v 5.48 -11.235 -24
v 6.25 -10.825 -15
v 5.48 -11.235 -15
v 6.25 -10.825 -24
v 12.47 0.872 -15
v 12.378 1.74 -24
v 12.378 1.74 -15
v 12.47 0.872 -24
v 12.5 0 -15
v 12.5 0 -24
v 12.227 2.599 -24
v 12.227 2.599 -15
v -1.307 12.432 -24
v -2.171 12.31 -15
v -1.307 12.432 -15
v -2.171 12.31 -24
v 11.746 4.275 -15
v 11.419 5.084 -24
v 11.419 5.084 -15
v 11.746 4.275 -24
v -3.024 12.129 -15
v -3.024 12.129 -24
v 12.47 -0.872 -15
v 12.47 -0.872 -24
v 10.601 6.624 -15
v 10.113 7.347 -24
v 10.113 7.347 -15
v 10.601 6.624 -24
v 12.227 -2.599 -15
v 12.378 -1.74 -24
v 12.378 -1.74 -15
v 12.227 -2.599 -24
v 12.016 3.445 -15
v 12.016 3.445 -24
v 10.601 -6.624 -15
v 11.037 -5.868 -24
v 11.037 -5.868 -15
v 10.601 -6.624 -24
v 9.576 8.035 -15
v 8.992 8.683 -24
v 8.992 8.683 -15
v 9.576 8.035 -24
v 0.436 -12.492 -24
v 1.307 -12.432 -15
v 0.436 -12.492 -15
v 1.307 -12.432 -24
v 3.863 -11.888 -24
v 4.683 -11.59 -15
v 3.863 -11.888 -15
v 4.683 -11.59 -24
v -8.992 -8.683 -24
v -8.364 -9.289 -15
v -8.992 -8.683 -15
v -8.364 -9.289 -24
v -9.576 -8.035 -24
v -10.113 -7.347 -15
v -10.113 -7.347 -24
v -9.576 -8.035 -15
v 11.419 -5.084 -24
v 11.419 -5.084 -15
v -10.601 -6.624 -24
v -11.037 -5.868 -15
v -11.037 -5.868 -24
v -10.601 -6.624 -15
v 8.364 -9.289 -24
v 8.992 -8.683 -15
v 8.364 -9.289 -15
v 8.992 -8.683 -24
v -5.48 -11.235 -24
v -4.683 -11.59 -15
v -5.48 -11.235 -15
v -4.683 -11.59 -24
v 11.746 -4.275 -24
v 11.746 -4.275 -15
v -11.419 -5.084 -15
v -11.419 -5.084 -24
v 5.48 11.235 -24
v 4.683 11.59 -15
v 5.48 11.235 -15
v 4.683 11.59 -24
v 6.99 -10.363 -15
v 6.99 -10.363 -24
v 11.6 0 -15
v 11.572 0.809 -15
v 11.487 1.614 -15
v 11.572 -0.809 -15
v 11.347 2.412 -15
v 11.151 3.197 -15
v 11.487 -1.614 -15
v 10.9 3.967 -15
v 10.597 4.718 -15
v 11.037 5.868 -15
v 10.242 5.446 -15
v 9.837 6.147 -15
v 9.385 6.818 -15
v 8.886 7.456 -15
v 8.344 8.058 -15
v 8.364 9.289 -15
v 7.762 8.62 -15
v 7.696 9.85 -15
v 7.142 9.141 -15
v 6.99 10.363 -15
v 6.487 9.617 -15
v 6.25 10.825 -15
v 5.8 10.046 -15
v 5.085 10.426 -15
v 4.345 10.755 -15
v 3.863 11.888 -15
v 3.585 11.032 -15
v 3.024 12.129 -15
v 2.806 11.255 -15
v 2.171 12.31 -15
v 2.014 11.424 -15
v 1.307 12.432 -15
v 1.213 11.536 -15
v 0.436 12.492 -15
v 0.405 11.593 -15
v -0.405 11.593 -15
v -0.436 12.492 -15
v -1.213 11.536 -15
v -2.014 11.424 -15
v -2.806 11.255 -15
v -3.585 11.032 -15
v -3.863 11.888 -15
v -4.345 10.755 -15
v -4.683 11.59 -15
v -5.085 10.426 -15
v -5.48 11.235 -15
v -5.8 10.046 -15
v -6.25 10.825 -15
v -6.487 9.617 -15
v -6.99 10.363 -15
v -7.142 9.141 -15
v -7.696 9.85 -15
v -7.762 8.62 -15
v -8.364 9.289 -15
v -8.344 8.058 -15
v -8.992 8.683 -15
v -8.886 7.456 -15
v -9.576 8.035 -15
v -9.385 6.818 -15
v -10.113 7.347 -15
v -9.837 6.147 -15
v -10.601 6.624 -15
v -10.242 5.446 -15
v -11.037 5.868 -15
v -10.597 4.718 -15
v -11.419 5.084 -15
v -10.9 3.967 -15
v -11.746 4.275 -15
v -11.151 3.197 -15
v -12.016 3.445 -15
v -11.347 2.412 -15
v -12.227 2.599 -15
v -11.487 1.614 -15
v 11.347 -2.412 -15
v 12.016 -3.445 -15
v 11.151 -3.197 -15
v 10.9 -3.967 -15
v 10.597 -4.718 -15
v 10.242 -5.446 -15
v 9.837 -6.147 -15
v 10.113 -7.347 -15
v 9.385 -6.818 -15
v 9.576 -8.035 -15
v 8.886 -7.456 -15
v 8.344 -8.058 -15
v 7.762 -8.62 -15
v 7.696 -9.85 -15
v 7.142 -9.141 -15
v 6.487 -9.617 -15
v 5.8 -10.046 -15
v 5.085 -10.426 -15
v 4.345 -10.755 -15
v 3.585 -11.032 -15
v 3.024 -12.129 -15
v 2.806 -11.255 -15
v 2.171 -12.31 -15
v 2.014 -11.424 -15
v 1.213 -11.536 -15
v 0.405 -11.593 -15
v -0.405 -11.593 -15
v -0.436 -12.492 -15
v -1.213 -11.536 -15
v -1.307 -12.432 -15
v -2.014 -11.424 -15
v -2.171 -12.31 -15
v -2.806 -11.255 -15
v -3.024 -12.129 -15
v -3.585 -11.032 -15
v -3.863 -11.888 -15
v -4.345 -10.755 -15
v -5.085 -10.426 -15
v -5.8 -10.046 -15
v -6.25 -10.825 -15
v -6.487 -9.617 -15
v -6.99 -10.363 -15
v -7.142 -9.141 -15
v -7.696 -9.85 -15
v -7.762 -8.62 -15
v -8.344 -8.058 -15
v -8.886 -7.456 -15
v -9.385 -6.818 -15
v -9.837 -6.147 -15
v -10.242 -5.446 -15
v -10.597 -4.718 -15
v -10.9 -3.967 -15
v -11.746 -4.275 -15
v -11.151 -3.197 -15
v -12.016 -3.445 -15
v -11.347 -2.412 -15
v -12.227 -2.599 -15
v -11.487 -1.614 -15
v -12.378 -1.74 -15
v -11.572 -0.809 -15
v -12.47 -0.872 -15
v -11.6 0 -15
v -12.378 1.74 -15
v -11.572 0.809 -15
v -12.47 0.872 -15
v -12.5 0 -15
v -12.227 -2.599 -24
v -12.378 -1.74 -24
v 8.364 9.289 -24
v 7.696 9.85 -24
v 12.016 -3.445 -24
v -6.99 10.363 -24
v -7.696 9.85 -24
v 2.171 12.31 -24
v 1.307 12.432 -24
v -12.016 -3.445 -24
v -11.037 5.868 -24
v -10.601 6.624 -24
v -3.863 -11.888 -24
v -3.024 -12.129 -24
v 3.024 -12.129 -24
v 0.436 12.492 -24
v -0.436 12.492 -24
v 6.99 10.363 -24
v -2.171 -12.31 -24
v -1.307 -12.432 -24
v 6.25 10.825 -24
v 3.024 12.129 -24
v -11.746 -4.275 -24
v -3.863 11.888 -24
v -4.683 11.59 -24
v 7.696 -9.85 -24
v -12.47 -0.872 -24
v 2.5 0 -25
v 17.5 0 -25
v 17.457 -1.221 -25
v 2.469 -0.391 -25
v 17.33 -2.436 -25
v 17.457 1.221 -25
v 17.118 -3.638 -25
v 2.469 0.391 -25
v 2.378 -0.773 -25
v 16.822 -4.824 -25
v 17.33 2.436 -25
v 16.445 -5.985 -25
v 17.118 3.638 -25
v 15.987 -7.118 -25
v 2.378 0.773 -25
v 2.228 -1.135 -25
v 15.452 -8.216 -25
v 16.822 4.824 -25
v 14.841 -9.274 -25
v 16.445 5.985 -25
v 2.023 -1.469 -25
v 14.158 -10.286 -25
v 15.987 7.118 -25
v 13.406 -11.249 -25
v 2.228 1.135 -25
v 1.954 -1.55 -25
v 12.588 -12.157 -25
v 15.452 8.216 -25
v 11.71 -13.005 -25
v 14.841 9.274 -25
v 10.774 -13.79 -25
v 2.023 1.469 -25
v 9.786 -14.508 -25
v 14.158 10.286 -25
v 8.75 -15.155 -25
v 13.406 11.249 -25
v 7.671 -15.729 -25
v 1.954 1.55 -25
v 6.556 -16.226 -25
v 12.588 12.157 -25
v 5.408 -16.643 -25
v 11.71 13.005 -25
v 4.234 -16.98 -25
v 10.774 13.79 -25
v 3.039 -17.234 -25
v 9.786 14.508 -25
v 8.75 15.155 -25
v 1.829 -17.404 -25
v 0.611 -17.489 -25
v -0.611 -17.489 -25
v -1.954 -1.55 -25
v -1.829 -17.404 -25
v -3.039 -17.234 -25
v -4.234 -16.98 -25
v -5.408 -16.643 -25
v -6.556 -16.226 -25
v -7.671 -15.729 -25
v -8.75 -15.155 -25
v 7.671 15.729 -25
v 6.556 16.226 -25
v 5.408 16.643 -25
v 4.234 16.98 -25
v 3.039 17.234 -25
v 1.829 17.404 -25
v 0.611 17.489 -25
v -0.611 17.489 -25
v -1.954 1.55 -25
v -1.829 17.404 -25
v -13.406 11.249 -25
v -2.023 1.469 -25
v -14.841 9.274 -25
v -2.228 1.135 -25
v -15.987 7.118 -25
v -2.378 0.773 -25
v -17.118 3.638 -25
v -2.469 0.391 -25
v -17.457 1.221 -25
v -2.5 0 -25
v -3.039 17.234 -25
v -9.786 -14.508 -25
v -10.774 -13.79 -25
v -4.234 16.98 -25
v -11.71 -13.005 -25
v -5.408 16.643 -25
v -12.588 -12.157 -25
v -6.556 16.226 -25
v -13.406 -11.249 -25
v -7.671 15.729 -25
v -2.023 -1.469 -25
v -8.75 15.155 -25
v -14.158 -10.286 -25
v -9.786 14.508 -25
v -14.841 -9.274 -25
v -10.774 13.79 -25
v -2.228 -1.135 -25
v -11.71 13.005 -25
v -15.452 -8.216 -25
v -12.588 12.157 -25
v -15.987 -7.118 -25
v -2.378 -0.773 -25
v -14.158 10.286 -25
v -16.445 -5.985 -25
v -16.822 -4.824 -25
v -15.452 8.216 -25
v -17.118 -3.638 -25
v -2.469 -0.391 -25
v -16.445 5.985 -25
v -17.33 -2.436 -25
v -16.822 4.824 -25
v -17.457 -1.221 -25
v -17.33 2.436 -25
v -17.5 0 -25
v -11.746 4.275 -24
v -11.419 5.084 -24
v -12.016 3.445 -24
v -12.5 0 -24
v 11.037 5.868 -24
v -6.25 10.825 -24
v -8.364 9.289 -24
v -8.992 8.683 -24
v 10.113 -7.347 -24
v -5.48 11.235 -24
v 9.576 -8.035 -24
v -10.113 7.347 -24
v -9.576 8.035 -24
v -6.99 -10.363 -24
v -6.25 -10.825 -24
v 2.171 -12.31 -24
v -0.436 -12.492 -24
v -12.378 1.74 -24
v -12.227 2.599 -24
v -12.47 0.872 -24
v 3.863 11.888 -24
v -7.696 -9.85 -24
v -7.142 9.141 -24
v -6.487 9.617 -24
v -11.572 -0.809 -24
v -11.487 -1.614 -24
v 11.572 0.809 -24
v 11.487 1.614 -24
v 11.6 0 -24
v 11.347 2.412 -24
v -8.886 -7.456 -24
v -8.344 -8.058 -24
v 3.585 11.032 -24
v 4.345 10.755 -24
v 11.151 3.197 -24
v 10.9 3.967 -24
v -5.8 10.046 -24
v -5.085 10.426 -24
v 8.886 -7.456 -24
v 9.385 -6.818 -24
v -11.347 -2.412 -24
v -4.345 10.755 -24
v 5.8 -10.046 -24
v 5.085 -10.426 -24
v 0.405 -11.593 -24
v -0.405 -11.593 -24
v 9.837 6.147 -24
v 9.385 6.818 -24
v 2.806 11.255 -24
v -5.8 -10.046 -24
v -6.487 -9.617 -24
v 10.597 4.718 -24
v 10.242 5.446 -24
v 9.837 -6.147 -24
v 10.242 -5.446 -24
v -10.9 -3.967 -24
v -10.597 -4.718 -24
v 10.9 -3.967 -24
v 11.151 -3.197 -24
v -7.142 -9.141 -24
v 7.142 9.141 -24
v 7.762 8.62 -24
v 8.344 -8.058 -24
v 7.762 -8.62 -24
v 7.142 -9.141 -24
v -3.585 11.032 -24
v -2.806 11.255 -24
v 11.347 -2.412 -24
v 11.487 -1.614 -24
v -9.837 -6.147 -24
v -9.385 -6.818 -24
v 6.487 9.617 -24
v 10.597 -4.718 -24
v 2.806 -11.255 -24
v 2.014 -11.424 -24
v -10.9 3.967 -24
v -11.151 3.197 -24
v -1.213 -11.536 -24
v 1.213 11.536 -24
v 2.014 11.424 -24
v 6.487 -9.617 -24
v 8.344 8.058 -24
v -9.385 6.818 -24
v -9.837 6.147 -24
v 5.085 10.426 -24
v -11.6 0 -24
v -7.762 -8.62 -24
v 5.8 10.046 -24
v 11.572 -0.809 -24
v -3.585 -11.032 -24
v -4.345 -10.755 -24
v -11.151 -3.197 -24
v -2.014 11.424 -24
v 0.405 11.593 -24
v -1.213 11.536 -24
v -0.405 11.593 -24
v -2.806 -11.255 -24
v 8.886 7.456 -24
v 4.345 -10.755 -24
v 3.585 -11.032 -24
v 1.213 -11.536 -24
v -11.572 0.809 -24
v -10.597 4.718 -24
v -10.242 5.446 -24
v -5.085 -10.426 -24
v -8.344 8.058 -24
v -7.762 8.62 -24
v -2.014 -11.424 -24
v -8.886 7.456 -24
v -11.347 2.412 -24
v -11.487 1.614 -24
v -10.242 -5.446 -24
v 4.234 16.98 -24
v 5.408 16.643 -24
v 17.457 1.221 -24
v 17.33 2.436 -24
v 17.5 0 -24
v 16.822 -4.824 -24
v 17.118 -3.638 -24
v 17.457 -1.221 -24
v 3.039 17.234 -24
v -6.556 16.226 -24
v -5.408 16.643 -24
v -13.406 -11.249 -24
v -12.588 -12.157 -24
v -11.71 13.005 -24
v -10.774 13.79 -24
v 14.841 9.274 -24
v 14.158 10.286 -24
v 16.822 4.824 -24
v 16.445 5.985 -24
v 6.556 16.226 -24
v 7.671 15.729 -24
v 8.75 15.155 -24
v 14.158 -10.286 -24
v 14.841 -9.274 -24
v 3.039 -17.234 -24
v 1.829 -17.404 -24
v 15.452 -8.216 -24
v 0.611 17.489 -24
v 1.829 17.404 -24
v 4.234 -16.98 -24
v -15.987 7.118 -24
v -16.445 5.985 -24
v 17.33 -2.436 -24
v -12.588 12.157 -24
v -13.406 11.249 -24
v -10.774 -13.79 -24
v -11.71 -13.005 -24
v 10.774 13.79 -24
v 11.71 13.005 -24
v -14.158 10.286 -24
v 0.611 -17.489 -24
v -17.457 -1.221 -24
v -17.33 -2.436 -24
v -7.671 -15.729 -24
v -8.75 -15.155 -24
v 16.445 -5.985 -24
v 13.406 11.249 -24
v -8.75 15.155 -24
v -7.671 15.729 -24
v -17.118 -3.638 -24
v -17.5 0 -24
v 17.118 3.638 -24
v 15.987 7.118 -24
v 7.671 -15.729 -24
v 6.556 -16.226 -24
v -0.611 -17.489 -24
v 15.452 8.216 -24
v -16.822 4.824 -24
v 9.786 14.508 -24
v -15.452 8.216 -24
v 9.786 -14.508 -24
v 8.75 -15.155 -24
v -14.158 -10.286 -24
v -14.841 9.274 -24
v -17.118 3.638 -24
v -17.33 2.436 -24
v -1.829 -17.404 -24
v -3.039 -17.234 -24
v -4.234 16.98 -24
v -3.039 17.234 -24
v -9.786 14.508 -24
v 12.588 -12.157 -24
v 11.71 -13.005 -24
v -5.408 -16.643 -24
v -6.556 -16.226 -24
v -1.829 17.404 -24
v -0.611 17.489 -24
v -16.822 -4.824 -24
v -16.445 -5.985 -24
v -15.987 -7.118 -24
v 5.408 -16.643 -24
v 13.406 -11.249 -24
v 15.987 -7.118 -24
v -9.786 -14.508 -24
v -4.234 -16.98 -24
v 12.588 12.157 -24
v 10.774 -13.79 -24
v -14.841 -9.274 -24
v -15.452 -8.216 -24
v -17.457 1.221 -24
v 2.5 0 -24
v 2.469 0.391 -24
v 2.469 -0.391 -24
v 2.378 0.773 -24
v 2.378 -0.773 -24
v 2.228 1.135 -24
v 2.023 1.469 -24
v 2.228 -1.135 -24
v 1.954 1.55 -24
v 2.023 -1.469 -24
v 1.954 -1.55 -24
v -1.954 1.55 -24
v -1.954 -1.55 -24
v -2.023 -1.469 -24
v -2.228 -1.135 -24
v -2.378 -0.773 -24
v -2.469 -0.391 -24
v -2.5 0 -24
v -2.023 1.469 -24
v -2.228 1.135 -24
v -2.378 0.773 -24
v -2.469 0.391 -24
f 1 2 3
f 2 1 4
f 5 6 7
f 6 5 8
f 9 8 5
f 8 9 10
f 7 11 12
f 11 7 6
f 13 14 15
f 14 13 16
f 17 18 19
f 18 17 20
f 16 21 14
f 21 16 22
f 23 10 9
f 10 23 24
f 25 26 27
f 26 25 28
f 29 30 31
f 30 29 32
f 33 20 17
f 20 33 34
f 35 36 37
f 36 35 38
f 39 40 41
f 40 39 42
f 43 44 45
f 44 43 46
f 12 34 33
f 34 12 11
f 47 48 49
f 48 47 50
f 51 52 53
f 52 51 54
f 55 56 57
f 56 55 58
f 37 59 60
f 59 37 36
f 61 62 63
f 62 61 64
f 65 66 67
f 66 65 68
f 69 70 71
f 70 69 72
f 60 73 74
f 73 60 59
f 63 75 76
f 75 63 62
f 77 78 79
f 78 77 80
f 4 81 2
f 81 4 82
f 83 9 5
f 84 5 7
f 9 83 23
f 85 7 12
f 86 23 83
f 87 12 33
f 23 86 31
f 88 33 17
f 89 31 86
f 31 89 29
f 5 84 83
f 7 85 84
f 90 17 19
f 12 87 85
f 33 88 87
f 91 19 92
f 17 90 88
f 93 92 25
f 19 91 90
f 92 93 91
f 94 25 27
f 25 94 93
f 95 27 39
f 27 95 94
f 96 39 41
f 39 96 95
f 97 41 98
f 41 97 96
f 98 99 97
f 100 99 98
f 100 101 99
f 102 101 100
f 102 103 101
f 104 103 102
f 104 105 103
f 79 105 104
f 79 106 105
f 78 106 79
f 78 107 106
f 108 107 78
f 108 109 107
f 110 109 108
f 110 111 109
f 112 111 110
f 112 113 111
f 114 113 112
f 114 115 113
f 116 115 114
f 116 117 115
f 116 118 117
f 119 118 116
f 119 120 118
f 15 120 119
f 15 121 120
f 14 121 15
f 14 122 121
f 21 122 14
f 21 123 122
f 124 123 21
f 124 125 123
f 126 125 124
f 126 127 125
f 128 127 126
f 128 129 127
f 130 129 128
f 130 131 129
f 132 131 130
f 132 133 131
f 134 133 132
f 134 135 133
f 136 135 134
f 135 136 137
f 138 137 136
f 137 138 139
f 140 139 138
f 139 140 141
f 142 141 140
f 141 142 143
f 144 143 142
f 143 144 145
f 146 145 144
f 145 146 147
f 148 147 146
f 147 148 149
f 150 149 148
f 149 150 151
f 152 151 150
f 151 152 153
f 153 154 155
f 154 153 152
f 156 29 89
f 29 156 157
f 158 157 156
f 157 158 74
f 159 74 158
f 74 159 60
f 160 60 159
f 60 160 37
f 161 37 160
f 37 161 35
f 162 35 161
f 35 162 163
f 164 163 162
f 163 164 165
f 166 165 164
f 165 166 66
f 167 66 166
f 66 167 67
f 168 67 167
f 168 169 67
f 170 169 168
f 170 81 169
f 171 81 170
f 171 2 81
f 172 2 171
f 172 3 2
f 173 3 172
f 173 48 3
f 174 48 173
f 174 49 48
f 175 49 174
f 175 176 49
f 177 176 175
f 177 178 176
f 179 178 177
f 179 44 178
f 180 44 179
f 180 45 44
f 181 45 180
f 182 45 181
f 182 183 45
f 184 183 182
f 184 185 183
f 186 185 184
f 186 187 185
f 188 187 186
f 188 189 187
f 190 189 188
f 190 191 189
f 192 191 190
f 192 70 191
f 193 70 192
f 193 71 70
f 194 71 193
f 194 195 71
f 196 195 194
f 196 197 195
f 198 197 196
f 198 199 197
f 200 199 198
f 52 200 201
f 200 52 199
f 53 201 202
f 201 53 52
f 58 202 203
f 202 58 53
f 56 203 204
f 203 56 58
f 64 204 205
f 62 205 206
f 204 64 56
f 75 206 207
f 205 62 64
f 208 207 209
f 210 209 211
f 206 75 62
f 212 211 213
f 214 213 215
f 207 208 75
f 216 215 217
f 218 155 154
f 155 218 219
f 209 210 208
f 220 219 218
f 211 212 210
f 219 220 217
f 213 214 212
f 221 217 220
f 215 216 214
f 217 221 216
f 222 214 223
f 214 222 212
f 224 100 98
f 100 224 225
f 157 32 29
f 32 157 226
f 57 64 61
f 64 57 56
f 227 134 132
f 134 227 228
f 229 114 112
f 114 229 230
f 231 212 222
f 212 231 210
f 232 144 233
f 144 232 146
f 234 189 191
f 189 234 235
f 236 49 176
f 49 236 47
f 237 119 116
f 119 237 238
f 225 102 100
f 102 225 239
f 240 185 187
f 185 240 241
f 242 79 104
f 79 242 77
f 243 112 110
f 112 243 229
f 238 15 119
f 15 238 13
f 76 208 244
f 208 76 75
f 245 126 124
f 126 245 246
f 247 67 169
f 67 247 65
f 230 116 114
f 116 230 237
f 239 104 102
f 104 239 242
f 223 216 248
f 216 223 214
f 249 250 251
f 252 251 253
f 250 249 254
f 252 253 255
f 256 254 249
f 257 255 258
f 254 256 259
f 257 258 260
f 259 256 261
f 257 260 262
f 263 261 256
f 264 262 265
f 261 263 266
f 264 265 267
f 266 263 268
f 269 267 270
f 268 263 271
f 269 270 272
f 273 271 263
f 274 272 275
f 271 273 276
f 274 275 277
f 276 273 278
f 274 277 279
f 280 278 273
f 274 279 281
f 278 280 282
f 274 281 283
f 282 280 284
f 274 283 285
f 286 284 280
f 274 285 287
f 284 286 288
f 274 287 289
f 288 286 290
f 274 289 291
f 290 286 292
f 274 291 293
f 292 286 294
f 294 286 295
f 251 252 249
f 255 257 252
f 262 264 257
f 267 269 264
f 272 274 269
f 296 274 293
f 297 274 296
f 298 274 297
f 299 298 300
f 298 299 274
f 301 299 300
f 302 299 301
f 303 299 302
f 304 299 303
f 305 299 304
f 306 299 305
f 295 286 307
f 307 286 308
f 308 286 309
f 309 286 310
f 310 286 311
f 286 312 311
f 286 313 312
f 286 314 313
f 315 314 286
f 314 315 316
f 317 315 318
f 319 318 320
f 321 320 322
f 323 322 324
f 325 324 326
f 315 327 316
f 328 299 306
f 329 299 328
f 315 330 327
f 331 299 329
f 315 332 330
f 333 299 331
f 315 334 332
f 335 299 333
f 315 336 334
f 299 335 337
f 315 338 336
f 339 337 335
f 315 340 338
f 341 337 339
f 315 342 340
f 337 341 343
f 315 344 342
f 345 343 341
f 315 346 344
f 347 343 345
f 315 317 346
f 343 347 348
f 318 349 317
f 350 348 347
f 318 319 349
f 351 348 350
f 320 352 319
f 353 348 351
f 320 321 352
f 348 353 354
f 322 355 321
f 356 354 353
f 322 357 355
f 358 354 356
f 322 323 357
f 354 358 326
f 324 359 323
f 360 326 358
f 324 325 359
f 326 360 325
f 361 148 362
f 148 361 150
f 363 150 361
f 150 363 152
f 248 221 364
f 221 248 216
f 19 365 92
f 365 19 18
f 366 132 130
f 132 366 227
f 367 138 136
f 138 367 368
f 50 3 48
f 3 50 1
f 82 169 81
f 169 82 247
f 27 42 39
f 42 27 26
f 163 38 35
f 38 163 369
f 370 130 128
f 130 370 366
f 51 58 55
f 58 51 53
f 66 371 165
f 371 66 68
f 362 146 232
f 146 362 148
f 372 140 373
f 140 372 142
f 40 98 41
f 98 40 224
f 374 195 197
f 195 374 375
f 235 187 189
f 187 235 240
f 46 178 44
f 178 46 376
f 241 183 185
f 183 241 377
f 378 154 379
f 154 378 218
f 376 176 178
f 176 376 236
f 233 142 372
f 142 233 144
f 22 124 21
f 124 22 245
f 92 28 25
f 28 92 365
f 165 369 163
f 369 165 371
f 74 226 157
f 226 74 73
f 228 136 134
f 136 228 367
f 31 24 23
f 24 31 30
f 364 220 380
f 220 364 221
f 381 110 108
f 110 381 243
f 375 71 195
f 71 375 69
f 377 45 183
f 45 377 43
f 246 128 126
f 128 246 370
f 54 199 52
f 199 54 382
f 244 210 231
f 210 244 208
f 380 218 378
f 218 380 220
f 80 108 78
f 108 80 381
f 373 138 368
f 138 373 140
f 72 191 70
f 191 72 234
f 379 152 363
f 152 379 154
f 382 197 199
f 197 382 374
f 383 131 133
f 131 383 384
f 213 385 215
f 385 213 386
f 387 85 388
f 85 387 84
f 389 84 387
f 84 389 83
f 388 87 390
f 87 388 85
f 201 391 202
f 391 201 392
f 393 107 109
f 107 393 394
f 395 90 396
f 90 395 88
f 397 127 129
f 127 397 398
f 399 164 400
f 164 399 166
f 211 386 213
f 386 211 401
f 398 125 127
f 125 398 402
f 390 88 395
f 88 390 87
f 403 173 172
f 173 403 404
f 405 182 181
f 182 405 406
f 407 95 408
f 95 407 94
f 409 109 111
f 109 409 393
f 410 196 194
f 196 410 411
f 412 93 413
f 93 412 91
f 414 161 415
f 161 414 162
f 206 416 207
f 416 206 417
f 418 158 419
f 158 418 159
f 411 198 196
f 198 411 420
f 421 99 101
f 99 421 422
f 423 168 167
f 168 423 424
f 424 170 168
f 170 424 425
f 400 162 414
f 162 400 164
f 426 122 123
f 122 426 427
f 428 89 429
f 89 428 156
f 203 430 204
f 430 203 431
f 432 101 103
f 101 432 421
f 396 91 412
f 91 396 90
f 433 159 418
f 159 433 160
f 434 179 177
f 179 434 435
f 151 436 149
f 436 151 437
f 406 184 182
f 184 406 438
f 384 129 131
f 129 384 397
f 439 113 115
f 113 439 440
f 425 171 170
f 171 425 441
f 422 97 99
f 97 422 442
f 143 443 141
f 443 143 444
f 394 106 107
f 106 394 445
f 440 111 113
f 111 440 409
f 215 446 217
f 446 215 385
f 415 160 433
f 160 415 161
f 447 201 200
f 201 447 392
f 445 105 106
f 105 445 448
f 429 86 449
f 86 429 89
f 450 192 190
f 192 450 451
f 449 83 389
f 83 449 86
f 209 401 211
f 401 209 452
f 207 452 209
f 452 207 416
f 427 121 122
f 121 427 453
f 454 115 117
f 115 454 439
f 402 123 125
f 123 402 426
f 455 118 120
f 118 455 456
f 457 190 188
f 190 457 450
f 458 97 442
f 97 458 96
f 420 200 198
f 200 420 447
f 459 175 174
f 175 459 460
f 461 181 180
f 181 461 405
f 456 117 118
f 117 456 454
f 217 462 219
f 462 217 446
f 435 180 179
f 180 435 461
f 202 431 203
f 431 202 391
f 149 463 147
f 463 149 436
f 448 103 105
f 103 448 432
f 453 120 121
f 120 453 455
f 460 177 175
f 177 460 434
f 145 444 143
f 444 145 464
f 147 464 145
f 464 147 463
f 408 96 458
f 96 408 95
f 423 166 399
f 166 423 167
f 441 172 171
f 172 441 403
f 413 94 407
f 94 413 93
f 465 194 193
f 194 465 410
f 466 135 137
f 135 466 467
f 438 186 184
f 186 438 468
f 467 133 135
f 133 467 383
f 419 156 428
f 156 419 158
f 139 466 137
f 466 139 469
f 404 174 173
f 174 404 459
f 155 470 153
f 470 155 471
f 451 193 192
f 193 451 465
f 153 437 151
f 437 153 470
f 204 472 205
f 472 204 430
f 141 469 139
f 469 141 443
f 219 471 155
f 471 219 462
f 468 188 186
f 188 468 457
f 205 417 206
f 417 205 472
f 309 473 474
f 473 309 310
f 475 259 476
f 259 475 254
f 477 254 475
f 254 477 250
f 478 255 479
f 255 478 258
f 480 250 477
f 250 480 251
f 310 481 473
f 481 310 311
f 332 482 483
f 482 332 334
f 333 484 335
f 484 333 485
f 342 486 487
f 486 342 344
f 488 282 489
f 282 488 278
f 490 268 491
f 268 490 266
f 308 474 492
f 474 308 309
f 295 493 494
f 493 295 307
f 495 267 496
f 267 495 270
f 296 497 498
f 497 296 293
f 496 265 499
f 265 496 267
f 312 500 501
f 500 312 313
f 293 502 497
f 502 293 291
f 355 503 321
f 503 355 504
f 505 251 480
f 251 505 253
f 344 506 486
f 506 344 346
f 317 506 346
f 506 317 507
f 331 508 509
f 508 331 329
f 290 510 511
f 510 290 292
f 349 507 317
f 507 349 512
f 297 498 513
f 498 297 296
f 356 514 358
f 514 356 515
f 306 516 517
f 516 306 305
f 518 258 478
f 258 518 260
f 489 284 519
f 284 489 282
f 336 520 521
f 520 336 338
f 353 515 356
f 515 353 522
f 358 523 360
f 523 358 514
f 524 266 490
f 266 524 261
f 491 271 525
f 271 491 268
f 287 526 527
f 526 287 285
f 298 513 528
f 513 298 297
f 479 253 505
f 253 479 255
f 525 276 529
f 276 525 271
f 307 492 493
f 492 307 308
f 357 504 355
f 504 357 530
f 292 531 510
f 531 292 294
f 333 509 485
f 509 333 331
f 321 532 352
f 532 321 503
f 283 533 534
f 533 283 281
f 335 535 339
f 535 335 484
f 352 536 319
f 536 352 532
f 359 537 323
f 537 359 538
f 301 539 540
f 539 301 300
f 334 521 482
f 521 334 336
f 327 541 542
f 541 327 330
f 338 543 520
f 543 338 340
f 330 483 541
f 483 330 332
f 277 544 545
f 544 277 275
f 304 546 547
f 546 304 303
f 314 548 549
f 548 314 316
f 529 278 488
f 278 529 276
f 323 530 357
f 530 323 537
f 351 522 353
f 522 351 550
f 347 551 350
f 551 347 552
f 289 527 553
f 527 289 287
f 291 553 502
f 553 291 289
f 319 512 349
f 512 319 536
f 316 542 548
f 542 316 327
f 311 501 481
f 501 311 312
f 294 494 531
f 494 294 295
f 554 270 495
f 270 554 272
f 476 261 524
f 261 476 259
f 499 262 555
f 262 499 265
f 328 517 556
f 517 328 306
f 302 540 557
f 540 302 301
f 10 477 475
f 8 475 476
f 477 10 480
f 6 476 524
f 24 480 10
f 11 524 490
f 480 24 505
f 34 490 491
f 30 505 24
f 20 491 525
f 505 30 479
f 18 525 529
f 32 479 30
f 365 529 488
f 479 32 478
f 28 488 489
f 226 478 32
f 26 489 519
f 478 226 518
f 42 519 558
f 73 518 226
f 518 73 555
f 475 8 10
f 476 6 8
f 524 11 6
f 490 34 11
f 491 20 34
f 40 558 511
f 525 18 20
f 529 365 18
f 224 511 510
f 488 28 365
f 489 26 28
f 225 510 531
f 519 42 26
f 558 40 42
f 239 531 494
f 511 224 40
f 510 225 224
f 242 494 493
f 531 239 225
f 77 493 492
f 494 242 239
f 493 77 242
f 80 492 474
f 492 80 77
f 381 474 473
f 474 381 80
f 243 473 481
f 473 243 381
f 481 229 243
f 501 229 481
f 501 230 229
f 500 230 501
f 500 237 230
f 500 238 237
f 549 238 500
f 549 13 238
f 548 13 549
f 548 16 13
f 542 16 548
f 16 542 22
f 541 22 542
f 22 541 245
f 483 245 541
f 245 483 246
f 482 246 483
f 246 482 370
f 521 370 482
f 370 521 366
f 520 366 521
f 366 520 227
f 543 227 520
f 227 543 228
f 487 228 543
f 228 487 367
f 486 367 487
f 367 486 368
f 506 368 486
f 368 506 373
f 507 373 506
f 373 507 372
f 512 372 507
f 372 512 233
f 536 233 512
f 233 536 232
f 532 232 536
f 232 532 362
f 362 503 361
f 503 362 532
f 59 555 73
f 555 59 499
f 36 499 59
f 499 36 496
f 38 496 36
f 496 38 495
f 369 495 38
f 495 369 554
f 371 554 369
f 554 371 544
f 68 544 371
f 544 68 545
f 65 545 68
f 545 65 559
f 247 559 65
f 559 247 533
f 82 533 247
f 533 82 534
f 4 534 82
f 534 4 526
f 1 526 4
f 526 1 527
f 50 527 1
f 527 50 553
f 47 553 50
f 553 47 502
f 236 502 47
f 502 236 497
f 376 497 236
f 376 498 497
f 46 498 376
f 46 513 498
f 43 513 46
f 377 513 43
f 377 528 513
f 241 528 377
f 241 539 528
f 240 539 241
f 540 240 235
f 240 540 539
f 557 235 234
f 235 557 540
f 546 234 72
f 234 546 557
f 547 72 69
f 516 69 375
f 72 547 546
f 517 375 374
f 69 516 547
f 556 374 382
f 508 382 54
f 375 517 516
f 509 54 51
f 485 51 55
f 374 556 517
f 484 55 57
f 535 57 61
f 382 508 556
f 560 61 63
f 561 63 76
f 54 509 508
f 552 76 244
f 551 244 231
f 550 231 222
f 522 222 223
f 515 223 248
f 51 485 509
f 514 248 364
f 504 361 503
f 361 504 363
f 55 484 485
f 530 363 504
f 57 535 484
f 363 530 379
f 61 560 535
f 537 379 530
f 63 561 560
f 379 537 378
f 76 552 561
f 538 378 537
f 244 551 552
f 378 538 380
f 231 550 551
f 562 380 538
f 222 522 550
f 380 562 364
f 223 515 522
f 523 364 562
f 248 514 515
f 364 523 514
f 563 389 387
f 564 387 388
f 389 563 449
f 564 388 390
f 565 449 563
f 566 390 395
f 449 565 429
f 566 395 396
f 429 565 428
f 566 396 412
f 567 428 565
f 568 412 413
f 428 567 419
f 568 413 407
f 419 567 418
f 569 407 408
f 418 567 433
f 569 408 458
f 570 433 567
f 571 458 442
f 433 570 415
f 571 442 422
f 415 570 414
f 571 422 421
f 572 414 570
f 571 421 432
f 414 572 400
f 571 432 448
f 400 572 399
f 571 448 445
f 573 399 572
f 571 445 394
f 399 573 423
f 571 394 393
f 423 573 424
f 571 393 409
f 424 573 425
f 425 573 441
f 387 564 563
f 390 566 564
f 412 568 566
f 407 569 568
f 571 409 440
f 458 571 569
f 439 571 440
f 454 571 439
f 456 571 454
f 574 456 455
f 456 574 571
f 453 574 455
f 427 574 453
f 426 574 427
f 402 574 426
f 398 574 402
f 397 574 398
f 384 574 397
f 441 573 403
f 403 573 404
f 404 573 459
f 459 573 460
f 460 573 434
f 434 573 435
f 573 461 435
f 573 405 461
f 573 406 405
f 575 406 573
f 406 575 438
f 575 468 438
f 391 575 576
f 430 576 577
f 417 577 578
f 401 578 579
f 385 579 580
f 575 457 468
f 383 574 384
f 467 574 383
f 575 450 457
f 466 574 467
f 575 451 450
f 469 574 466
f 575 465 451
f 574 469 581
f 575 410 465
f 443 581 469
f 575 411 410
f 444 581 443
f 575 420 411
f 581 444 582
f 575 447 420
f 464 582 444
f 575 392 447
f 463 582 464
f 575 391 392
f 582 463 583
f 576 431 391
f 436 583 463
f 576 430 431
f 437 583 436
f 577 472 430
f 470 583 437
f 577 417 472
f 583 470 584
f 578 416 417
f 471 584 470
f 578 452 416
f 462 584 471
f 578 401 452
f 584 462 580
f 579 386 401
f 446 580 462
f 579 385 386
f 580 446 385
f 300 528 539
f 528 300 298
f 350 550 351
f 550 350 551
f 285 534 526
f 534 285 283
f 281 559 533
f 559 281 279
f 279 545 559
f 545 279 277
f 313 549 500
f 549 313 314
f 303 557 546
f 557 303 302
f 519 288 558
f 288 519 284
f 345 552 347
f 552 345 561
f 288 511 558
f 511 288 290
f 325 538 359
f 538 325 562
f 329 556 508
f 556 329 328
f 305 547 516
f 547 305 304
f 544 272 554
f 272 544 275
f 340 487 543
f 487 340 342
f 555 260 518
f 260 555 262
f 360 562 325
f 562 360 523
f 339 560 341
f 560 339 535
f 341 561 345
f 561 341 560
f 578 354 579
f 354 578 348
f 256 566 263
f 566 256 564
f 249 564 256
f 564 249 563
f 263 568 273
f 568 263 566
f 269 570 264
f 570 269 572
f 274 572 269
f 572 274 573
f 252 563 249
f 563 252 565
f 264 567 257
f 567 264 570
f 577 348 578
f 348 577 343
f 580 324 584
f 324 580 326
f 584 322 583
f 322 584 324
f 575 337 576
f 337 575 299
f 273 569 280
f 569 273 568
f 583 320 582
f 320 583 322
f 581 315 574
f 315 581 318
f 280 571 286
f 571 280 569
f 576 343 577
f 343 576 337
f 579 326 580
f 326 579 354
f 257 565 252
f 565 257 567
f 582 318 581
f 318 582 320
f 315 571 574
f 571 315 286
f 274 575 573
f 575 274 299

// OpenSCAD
pulley_width = 10; // mmm
pulley_axis_diameter = 5; // eg motor axis 
pilley_axis_cut = 3.1; // e.g. for stepper28BYJ
pulley_outer_diameter = 25; // outer diamter of the pulley
pulley_wall_height = 5;
pulley_wall_thickness = 1;

$fn=90;
explosion = 1;

difference() {
    union() {
        cylinder(h=pulley_width,r=(pulley_outer_diameter-2)/2,center=true);
        translate([0,0,(pulley_width-pulley_wall_thickness)/2]) cylinder(h=pulley_wall_thickness,r=(pulley_outer_diameter/2)+pulley_wall_height,center=true);
    }
    axis_profile_28BYJ();
} 

!translate([0,0,-20*explosion]) {
    difference() {
        union() {
            difference() {
                cylinder(h=pulley_width,r=(pulley_outer_diameter)/2,center=true);
                cylinder(h=pulley_width,r=(pulley_outer_diameter-1.8)/2,center=true);
         
            }
            translate([0,0,-(pulley_width-pulley_wall_thickness)/2]) cylinder(h=pulley_wall_thickness,r=(pulley_outer_diameter/2)+pulley_wall_height,center=true);
        }
         axis_profile_28BYJ();
    }
}


module axis_profile_round() {
    cylinder(h=pulley_width+2,r=pulley_axis_diameter/2,center=true);
    
}

module axis_profile_28BYJ() {
        intersection() {
        cylinder(h=pulley_width+10,r=pulley_axis_diameter/2,center=true,$fn=40);
        cube([pulley_axis_diameter,pilley_axis_cut,pulley_width+2],center=true);
    }
    
}
